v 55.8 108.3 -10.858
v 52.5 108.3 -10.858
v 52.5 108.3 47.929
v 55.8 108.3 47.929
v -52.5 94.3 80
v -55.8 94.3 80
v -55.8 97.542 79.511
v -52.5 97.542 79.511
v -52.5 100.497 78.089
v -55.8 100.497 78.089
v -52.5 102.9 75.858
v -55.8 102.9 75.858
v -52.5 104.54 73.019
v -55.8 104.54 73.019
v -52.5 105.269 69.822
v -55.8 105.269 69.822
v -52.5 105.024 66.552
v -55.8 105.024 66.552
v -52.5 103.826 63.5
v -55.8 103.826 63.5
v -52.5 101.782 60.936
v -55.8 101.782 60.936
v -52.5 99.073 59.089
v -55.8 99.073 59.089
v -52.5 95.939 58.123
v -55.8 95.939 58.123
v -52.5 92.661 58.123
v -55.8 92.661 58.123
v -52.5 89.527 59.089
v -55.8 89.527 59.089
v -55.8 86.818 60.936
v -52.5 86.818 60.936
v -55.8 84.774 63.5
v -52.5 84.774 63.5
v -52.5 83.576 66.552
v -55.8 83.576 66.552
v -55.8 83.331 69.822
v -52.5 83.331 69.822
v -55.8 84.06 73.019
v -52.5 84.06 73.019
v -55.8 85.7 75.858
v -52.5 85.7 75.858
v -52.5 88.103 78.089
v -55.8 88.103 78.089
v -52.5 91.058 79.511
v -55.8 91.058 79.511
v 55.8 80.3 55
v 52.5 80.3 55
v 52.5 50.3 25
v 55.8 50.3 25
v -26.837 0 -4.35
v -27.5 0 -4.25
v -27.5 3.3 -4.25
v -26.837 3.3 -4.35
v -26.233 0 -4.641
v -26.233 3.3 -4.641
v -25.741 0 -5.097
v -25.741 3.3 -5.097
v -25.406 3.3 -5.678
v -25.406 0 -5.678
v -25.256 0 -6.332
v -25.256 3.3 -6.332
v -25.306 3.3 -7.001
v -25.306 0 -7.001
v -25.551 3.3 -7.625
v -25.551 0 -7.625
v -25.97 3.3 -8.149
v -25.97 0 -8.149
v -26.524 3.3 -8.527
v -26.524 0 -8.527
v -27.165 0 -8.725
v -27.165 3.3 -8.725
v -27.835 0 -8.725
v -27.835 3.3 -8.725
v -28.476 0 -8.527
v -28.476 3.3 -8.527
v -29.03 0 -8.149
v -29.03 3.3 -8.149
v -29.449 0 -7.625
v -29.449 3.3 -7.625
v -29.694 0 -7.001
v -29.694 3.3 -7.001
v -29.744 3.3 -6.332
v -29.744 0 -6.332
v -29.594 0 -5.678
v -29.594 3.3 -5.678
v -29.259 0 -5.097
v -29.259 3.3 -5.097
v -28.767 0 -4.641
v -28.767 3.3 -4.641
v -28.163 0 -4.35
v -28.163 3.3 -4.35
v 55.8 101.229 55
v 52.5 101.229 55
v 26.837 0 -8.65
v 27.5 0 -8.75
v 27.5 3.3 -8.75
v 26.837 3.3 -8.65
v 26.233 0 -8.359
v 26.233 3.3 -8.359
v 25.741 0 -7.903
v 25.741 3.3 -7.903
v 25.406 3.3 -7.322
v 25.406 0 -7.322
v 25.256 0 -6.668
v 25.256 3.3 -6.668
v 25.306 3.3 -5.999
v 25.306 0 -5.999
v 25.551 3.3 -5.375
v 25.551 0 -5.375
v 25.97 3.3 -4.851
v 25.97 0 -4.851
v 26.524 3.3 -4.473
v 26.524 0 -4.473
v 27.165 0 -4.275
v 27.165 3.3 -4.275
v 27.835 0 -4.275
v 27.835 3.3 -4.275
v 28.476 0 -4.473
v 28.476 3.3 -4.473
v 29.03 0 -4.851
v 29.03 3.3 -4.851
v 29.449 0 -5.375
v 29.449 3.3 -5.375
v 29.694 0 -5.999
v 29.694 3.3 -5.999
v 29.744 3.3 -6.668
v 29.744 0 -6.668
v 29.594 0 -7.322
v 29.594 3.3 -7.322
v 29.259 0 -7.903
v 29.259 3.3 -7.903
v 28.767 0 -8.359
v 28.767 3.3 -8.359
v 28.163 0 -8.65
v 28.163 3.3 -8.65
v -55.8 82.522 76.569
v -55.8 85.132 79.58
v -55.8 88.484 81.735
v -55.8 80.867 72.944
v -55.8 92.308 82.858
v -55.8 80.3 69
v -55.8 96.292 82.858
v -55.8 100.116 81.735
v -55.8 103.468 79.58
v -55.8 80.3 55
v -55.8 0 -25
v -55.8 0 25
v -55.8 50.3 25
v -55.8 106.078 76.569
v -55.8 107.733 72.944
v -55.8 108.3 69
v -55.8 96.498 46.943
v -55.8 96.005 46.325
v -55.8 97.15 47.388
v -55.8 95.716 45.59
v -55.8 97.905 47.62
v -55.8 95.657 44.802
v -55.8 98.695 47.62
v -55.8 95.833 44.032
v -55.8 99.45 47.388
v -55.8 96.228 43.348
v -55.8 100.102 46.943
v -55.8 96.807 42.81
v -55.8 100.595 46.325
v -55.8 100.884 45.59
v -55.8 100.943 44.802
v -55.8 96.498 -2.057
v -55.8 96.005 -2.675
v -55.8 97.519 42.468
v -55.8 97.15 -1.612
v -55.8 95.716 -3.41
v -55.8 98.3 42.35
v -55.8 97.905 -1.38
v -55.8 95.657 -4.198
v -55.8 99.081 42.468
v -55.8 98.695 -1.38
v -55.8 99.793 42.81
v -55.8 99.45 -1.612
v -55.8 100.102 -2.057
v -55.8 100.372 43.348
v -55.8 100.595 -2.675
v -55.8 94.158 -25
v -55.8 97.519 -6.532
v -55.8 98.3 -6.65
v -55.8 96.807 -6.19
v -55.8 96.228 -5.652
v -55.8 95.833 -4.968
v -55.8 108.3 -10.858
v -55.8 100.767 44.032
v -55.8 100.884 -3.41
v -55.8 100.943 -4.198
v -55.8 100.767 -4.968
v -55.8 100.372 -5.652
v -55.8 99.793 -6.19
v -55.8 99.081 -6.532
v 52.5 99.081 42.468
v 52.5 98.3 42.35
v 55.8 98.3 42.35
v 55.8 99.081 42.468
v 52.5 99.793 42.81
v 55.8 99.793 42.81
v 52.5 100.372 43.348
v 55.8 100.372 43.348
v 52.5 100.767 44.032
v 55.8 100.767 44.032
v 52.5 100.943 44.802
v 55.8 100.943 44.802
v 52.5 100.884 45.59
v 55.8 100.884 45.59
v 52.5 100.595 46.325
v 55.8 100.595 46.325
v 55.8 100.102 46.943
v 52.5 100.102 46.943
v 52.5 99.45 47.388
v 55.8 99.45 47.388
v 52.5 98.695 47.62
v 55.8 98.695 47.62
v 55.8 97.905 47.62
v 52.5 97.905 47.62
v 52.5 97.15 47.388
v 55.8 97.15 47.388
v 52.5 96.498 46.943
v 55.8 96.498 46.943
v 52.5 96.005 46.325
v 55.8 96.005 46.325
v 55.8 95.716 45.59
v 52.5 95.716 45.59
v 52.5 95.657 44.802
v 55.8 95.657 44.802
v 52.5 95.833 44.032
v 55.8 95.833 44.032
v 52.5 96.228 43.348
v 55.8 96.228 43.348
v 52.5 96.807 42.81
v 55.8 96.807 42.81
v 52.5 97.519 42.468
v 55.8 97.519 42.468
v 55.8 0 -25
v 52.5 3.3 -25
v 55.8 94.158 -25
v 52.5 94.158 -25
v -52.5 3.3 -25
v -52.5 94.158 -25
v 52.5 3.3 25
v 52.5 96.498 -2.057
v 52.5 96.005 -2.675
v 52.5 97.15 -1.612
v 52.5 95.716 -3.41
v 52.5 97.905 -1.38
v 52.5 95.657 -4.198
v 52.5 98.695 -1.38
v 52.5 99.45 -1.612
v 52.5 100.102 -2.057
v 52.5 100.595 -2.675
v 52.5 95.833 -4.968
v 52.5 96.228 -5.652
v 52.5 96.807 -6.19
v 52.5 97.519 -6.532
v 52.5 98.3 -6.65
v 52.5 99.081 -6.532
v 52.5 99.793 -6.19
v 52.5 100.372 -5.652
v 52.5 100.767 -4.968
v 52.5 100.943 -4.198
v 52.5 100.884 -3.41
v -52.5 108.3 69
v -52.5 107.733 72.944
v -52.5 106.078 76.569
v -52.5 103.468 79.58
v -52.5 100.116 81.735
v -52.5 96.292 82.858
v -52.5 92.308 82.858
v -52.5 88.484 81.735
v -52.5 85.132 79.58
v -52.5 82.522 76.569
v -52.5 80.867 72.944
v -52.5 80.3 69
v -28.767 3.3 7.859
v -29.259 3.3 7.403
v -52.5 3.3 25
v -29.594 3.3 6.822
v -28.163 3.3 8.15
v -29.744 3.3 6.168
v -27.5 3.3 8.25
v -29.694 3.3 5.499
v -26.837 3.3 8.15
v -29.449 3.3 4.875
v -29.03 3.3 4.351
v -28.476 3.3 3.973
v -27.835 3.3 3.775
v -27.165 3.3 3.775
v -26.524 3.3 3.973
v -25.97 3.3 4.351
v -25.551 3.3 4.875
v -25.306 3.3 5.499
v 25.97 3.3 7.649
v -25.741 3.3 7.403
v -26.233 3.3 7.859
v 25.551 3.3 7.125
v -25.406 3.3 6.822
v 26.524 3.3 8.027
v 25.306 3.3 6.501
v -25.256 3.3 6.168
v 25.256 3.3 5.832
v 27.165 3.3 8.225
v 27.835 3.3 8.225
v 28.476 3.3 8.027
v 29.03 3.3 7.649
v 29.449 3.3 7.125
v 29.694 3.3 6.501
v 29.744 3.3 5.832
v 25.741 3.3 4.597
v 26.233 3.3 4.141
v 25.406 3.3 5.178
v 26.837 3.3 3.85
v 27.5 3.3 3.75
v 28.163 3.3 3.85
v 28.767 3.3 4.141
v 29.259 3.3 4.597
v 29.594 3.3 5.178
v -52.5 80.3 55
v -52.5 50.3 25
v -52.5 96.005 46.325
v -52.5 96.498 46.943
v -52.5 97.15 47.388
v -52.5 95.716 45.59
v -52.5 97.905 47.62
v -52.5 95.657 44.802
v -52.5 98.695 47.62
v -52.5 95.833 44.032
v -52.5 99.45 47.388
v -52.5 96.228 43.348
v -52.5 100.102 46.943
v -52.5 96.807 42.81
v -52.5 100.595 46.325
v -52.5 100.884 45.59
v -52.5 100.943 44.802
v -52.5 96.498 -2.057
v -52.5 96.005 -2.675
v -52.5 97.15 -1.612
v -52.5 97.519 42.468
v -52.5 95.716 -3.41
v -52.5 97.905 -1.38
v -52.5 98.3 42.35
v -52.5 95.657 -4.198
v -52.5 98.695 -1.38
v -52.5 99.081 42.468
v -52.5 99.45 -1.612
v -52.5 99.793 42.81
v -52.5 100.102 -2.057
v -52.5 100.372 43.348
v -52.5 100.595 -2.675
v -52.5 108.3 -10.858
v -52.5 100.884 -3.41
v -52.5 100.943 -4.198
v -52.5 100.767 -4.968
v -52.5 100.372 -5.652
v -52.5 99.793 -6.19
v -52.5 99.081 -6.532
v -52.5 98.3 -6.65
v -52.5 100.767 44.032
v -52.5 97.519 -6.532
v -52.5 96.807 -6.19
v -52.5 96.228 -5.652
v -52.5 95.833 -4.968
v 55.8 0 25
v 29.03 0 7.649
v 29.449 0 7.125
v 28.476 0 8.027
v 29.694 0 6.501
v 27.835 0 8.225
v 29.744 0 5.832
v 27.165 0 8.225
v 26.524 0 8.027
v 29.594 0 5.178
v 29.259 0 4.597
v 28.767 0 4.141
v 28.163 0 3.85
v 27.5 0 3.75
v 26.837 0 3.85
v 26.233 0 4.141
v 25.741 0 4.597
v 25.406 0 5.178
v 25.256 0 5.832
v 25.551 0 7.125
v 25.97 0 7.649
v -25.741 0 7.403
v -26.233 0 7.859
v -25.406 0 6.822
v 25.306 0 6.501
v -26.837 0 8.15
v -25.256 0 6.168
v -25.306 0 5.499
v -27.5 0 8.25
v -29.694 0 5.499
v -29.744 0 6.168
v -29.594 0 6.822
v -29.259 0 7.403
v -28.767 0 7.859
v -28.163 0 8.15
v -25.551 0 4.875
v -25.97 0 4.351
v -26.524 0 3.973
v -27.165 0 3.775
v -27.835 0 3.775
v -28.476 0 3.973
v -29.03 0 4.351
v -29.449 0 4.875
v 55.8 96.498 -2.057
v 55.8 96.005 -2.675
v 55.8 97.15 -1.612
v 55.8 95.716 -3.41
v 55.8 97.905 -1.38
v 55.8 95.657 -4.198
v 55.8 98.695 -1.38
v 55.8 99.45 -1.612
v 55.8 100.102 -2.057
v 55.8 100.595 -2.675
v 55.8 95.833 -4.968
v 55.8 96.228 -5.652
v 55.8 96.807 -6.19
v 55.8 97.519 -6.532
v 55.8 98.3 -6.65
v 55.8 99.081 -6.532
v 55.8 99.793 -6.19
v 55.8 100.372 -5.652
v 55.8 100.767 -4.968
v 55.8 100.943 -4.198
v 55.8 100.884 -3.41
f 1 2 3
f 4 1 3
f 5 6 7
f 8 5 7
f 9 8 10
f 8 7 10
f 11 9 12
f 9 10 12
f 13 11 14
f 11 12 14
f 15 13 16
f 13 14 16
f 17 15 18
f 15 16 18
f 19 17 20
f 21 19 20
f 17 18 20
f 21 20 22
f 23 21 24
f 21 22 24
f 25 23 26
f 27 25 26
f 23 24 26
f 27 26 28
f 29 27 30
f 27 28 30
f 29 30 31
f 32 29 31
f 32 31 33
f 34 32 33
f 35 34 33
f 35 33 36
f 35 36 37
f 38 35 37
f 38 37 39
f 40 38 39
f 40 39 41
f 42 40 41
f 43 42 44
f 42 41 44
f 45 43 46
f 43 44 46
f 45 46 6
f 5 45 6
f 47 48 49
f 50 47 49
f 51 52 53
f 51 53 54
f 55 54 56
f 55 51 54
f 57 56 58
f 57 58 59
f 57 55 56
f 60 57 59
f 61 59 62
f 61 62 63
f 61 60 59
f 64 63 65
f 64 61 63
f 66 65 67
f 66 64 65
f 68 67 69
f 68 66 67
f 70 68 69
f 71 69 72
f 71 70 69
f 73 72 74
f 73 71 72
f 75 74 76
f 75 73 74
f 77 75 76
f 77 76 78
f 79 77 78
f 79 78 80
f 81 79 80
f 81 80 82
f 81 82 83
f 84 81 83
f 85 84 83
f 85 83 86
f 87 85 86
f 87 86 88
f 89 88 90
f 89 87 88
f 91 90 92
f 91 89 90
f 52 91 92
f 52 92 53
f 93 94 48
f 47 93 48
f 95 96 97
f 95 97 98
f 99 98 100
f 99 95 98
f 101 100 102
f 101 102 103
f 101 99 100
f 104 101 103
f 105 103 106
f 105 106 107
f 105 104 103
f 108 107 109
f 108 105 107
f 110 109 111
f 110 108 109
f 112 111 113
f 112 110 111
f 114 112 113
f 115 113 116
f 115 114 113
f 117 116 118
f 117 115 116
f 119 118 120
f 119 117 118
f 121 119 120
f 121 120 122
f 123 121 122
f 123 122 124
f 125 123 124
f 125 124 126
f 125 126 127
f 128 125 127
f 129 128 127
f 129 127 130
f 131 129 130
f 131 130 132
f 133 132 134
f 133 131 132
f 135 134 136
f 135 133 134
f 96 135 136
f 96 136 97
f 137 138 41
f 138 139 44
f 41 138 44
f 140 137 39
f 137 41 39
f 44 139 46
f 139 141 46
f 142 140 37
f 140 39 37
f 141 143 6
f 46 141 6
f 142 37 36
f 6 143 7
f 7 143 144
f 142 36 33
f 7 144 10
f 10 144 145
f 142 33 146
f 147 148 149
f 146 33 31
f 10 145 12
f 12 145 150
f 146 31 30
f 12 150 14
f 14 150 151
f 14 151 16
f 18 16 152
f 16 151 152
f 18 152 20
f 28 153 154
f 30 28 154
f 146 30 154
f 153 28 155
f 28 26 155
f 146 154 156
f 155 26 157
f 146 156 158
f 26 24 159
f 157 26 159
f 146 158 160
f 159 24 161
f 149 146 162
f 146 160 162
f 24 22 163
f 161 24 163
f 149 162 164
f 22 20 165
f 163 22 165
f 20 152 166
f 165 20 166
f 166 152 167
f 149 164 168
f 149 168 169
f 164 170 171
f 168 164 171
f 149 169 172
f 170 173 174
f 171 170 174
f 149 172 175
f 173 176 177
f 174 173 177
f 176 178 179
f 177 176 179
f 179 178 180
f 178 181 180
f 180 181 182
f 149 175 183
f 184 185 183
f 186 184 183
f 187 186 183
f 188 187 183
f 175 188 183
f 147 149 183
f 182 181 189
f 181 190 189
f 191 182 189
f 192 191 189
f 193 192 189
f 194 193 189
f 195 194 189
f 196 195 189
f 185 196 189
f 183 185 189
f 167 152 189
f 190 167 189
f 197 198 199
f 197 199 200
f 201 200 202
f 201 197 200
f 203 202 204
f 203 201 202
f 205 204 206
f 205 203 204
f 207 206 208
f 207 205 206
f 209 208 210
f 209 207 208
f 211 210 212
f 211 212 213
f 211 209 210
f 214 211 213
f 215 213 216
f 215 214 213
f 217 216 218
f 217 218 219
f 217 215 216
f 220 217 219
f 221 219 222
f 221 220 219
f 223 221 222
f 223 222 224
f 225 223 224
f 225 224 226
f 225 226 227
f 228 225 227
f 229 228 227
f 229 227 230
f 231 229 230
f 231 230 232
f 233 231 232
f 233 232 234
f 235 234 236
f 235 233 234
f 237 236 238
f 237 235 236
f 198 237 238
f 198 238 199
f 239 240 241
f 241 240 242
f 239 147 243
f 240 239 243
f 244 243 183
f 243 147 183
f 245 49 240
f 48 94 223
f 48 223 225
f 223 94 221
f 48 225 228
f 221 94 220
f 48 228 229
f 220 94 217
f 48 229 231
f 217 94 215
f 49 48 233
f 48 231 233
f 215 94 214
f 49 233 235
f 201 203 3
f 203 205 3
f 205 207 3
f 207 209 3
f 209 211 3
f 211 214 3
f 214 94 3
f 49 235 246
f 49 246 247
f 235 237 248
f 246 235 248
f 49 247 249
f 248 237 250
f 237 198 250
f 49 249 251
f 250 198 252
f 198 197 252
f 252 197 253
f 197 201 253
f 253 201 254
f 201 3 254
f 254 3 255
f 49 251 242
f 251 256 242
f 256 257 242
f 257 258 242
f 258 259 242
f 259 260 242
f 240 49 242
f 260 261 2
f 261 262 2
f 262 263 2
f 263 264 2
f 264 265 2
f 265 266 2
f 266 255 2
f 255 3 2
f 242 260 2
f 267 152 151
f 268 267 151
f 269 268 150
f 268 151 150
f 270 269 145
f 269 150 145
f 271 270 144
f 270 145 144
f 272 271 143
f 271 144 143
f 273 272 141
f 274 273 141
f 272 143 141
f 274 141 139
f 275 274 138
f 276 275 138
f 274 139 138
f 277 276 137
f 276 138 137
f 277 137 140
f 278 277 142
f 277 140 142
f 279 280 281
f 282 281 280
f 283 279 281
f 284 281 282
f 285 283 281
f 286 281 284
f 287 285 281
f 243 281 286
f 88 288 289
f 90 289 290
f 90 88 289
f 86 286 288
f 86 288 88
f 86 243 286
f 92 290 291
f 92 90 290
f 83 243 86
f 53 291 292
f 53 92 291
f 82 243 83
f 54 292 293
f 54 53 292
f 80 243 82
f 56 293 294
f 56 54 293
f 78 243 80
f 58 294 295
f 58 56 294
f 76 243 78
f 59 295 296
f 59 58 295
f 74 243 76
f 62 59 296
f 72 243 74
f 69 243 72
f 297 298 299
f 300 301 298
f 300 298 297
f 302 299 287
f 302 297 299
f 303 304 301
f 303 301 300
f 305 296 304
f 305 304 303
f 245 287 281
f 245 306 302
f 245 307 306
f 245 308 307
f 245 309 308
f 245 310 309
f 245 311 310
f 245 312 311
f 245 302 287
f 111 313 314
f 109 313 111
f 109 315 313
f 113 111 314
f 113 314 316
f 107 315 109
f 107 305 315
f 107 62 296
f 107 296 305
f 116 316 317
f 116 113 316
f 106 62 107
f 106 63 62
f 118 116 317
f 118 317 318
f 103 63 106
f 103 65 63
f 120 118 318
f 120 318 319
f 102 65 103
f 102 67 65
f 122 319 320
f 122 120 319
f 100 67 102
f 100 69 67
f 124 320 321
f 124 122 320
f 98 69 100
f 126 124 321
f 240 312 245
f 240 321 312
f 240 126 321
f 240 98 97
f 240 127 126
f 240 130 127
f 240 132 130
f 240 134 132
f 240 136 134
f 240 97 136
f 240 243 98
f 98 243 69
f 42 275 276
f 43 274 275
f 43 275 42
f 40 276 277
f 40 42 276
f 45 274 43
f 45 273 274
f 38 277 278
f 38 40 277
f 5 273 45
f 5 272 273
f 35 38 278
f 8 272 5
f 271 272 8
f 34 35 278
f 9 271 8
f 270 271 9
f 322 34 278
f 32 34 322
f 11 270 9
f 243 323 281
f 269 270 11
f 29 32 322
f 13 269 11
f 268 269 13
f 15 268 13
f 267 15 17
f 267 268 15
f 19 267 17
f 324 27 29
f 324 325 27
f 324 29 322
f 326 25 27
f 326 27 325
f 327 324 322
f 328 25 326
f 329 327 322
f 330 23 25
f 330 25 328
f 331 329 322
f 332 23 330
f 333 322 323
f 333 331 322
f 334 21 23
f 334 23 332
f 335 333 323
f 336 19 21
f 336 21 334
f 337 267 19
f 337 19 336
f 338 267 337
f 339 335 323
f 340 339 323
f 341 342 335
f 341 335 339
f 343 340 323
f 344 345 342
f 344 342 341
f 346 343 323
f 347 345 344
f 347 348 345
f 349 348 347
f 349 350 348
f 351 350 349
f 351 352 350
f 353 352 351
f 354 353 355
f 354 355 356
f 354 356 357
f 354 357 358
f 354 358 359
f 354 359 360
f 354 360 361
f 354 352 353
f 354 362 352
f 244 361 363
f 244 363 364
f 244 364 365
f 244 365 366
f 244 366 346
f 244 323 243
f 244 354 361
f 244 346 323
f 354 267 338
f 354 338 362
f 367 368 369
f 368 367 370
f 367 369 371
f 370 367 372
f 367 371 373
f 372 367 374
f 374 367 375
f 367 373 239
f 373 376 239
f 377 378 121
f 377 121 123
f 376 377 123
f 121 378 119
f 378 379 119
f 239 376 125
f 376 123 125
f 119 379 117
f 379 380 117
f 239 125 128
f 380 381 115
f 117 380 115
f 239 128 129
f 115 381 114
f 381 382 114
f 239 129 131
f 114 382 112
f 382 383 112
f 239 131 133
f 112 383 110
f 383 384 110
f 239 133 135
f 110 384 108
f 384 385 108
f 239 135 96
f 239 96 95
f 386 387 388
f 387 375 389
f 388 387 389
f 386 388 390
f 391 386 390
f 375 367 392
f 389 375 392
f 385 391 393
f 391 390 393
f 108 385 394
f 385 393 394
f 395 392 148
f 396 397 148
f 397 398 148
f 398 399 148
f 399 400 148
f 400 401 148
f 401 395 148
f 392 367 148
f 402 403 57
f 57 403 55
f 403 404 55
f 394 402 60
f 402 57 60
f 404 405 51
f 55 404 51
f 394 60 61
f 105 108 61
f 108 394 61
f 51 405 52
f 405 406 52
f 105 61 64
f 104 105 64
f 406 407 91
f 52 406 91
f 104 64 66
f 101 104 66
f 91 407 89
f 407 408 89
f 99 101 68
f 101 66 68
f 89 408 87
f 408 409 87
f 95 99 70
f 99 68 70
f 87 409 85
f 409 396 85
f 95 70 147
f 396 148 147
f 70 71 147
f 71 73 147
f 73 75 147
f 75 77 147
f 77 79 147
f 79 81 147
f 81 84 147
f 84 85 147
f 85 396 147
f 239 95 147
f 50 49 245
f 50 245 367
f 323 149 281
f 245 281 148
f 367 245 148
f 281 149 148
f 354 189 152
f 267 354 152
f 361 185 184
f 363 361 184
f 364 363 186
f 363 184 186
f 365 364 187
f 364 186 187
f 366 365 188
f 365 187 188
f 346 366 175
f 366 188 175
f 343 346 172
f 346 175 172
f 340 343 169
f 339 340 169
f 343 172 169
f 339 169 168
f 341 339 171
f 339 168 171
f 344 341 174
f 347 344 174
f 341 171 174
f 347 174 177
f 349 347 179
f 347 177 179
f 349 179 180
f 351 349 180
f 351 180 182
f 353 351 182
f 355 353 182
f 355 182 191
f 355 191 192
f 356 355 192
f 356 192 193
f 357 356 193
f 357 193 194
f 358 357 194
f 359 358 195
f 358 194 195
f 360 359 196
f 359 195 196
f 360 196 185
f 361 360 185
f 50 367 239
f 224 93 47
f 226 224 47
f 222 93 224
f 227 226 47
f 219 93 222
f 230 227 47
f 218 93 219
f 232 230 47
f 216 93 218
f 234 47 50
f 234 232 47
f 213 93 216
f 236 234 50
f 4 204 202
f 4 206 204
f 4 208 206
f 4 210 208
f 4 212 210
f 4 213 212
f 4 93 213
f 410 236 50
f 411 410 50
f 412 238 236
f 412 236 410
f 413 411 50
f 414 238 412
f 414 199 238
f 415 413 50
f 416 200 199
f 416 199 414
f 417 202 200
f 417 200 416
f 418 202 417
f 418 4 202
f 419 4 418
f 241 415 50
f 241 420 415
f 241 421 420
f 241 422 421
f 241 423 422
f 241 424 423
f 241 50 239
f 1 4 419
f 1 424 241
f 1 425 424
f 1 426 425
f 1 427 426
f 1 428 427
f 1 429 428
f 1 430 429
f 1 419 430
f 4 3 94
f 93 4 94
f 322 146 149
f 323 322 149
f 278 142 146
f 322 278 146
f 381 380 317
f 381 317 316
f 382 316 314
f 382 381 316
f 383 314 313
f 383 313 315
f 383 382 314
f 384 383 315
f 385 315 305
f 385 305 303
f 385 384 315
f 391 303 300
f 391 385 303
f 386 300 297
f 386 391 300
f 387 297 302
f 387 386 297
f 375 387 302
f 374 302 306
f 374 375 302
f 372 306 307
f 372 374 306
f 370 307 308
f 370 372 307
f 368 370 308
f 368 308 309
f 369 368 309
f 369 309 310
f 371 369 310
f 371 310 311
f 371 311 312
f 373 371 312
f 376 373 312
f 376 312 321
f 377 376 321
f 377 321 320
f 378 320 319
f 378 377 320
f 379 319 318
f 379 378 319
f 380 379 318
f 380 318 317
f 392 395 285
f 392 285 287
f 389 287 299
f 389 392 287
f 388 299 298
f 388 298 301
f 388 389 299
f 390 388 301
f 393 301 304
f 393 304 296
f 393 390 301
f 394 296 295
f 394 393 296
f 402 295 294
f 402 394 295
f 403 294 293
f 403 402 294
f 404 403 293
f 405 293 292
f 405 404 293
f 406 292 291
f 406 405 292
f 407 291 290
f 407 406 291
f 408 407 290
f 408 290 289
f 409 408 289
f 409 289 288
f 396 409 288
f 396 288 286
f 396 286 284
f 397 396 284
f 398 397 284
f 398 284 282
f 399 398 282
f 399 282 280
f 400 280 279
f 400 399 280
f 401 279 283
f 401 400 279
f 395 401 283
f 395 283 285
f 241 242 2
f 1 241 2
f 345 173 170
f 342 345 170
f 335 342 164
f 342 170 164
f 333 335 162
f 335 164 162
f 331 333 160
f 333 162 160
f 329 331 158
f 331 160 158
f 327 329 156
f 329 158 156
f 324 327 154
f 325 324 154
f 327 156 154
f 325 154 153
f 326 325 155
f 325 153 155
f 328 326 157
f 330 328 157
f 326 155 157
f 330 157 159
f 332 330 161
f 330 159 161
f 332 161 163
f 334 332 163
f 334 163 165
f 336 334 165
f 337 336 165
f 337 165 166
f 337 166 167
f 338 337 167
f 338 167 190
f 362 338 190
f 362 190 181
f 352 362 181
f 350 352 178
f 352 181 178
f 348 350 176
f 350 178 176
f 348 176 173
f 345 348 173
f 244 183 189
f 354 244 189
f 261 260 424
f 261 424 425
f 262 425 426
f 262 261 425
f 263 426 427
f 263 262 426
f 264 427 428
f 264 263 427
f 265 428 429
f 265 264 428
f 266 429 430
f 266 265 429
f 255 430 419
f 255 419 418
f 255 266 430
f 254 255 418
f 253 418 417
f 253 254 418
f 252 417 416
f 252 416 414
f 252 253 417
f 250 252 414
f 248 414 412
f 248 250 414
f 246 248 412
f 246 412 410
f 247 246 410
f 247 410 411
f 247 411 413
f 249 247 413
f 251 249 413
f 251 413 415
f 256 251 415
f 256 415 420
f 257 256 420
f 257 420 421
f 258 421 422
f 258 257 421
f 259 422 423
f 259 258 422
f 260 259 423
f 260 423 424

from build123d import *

# Parameters (mm, degrees)
SKETCH1_W           = 105
SKETCH1_H           = 50
SKETCH1_R           = 2.25
BOSS_EXTRUDE1_DEPTH = 3.3
SKETCH2_R           = 2.65
BOSS_EXTRUDE2_DEPTH = 3.3
BOSS_EXTRUDE3_START = 3.3
SKETCH3_R           = 11
SKETCH3_R_2         = 2.65
BOSS_EXTRUDE3_DEPTH = 3.3


with BuildPart() as part:
    # Sketch1 → Boss-Extrude1 (new body)
    with BuildSketch(Plane(origin=(0, 0, 0), x_dir=(1, 0, 0), z_dir=(0, 1, 0))):
        Rectangle(SKETCH1_W, SKETCH1_H)
        with Locations(Location((-27.5, 6.5, 0), (0, 0, 270))):
            Circle(SKETCH1_R, mode=Mode.SUBTRACT)
        with Locations(Location((-27.5, -6, 0), (0, 0, 270))):
            Circle(SKETCH1_R, mode=Mode.SUBTRACT)
        with Locations(Location((27.5, -6, 0), (0, 0, 90))):
            Circle(SKETCH1_R, mode=Mode.SUBTRACT)
        with Locations(Location((27.5, 6.5, 0), (0, 0, 90))):
            Circle(SKETCH1_R, mode=Mode.SUBTRACT)
    extrude(amount=BOSS_EXTRUDE1_DEPTH)

    # Sketch2 → Boss-Extrude2 (add)
    with BuildSketch(Plane(origin=(52.5, 0, 0), x_dir=(0, 0, -1), z_dir=(1, 0, 0))):
        Polygon((25, 0), (25, 94.157864376), (10.857864376, 108.3), (-47.928932188, 108.3), (-55, 101.228932188), (-55, 80.3), (-25, 50.3), (-25, 0), align=None)
        with Locations((-45, 98.3)):
            Circle(SKETCH2_R, mode=Mode.SUBTRACT)
        with Locations((4, 98.3)):
            Circle(SKETCH2_R, mode=Mode.SUBTRACT)
    extrude(amount=BOSS_EXTRUDE2_DEPTH)

    # Sketch3 → Boss-Extrude3 (add)
    with BuildSketch(Plane.ZY.offset(52.5).offset(BOSS_EXTRUDE3_START)):
        with BuildLine():
            Line((47.928932188, 108.3), (69, 108.3))
            ThreePointArc((69, 108.3), (83, 94.3), (69, 80.3))
            Line((69, 80.3), (55, 80.3))
            Line((55, 80.3), (25, 50.3))
            Line((25, 50.3), (25, 0))
            Line((25, 0), (-25, 0))
            Line((-25, 0), (-25, 94.157864376))
            Line((-25, 94.157864376), (-10.857864376, 108.3))
            Line((-10.857864376, 108.3), (47.928932188, 108.3))
        make_face()
        with Locations((69, 94.3)):
            Circle(SKETCH3_R, mode=Mode.SUBTRACT)
        with Locations(Location((-4, 98.3, 0), (0, 0, 180))):
            Circle(SKETCH3_R_2, mode=Mode.SUBTRACT)
        with Locations(Location((45, 98.3, 0), (0, 0, 180))):
            Circle(SKETCH3_R_2, mode=Mode.SUBTRACT)
    extrude(amount=-BOSS_EXTRUDE3_DEPTH)


solid = part.part
